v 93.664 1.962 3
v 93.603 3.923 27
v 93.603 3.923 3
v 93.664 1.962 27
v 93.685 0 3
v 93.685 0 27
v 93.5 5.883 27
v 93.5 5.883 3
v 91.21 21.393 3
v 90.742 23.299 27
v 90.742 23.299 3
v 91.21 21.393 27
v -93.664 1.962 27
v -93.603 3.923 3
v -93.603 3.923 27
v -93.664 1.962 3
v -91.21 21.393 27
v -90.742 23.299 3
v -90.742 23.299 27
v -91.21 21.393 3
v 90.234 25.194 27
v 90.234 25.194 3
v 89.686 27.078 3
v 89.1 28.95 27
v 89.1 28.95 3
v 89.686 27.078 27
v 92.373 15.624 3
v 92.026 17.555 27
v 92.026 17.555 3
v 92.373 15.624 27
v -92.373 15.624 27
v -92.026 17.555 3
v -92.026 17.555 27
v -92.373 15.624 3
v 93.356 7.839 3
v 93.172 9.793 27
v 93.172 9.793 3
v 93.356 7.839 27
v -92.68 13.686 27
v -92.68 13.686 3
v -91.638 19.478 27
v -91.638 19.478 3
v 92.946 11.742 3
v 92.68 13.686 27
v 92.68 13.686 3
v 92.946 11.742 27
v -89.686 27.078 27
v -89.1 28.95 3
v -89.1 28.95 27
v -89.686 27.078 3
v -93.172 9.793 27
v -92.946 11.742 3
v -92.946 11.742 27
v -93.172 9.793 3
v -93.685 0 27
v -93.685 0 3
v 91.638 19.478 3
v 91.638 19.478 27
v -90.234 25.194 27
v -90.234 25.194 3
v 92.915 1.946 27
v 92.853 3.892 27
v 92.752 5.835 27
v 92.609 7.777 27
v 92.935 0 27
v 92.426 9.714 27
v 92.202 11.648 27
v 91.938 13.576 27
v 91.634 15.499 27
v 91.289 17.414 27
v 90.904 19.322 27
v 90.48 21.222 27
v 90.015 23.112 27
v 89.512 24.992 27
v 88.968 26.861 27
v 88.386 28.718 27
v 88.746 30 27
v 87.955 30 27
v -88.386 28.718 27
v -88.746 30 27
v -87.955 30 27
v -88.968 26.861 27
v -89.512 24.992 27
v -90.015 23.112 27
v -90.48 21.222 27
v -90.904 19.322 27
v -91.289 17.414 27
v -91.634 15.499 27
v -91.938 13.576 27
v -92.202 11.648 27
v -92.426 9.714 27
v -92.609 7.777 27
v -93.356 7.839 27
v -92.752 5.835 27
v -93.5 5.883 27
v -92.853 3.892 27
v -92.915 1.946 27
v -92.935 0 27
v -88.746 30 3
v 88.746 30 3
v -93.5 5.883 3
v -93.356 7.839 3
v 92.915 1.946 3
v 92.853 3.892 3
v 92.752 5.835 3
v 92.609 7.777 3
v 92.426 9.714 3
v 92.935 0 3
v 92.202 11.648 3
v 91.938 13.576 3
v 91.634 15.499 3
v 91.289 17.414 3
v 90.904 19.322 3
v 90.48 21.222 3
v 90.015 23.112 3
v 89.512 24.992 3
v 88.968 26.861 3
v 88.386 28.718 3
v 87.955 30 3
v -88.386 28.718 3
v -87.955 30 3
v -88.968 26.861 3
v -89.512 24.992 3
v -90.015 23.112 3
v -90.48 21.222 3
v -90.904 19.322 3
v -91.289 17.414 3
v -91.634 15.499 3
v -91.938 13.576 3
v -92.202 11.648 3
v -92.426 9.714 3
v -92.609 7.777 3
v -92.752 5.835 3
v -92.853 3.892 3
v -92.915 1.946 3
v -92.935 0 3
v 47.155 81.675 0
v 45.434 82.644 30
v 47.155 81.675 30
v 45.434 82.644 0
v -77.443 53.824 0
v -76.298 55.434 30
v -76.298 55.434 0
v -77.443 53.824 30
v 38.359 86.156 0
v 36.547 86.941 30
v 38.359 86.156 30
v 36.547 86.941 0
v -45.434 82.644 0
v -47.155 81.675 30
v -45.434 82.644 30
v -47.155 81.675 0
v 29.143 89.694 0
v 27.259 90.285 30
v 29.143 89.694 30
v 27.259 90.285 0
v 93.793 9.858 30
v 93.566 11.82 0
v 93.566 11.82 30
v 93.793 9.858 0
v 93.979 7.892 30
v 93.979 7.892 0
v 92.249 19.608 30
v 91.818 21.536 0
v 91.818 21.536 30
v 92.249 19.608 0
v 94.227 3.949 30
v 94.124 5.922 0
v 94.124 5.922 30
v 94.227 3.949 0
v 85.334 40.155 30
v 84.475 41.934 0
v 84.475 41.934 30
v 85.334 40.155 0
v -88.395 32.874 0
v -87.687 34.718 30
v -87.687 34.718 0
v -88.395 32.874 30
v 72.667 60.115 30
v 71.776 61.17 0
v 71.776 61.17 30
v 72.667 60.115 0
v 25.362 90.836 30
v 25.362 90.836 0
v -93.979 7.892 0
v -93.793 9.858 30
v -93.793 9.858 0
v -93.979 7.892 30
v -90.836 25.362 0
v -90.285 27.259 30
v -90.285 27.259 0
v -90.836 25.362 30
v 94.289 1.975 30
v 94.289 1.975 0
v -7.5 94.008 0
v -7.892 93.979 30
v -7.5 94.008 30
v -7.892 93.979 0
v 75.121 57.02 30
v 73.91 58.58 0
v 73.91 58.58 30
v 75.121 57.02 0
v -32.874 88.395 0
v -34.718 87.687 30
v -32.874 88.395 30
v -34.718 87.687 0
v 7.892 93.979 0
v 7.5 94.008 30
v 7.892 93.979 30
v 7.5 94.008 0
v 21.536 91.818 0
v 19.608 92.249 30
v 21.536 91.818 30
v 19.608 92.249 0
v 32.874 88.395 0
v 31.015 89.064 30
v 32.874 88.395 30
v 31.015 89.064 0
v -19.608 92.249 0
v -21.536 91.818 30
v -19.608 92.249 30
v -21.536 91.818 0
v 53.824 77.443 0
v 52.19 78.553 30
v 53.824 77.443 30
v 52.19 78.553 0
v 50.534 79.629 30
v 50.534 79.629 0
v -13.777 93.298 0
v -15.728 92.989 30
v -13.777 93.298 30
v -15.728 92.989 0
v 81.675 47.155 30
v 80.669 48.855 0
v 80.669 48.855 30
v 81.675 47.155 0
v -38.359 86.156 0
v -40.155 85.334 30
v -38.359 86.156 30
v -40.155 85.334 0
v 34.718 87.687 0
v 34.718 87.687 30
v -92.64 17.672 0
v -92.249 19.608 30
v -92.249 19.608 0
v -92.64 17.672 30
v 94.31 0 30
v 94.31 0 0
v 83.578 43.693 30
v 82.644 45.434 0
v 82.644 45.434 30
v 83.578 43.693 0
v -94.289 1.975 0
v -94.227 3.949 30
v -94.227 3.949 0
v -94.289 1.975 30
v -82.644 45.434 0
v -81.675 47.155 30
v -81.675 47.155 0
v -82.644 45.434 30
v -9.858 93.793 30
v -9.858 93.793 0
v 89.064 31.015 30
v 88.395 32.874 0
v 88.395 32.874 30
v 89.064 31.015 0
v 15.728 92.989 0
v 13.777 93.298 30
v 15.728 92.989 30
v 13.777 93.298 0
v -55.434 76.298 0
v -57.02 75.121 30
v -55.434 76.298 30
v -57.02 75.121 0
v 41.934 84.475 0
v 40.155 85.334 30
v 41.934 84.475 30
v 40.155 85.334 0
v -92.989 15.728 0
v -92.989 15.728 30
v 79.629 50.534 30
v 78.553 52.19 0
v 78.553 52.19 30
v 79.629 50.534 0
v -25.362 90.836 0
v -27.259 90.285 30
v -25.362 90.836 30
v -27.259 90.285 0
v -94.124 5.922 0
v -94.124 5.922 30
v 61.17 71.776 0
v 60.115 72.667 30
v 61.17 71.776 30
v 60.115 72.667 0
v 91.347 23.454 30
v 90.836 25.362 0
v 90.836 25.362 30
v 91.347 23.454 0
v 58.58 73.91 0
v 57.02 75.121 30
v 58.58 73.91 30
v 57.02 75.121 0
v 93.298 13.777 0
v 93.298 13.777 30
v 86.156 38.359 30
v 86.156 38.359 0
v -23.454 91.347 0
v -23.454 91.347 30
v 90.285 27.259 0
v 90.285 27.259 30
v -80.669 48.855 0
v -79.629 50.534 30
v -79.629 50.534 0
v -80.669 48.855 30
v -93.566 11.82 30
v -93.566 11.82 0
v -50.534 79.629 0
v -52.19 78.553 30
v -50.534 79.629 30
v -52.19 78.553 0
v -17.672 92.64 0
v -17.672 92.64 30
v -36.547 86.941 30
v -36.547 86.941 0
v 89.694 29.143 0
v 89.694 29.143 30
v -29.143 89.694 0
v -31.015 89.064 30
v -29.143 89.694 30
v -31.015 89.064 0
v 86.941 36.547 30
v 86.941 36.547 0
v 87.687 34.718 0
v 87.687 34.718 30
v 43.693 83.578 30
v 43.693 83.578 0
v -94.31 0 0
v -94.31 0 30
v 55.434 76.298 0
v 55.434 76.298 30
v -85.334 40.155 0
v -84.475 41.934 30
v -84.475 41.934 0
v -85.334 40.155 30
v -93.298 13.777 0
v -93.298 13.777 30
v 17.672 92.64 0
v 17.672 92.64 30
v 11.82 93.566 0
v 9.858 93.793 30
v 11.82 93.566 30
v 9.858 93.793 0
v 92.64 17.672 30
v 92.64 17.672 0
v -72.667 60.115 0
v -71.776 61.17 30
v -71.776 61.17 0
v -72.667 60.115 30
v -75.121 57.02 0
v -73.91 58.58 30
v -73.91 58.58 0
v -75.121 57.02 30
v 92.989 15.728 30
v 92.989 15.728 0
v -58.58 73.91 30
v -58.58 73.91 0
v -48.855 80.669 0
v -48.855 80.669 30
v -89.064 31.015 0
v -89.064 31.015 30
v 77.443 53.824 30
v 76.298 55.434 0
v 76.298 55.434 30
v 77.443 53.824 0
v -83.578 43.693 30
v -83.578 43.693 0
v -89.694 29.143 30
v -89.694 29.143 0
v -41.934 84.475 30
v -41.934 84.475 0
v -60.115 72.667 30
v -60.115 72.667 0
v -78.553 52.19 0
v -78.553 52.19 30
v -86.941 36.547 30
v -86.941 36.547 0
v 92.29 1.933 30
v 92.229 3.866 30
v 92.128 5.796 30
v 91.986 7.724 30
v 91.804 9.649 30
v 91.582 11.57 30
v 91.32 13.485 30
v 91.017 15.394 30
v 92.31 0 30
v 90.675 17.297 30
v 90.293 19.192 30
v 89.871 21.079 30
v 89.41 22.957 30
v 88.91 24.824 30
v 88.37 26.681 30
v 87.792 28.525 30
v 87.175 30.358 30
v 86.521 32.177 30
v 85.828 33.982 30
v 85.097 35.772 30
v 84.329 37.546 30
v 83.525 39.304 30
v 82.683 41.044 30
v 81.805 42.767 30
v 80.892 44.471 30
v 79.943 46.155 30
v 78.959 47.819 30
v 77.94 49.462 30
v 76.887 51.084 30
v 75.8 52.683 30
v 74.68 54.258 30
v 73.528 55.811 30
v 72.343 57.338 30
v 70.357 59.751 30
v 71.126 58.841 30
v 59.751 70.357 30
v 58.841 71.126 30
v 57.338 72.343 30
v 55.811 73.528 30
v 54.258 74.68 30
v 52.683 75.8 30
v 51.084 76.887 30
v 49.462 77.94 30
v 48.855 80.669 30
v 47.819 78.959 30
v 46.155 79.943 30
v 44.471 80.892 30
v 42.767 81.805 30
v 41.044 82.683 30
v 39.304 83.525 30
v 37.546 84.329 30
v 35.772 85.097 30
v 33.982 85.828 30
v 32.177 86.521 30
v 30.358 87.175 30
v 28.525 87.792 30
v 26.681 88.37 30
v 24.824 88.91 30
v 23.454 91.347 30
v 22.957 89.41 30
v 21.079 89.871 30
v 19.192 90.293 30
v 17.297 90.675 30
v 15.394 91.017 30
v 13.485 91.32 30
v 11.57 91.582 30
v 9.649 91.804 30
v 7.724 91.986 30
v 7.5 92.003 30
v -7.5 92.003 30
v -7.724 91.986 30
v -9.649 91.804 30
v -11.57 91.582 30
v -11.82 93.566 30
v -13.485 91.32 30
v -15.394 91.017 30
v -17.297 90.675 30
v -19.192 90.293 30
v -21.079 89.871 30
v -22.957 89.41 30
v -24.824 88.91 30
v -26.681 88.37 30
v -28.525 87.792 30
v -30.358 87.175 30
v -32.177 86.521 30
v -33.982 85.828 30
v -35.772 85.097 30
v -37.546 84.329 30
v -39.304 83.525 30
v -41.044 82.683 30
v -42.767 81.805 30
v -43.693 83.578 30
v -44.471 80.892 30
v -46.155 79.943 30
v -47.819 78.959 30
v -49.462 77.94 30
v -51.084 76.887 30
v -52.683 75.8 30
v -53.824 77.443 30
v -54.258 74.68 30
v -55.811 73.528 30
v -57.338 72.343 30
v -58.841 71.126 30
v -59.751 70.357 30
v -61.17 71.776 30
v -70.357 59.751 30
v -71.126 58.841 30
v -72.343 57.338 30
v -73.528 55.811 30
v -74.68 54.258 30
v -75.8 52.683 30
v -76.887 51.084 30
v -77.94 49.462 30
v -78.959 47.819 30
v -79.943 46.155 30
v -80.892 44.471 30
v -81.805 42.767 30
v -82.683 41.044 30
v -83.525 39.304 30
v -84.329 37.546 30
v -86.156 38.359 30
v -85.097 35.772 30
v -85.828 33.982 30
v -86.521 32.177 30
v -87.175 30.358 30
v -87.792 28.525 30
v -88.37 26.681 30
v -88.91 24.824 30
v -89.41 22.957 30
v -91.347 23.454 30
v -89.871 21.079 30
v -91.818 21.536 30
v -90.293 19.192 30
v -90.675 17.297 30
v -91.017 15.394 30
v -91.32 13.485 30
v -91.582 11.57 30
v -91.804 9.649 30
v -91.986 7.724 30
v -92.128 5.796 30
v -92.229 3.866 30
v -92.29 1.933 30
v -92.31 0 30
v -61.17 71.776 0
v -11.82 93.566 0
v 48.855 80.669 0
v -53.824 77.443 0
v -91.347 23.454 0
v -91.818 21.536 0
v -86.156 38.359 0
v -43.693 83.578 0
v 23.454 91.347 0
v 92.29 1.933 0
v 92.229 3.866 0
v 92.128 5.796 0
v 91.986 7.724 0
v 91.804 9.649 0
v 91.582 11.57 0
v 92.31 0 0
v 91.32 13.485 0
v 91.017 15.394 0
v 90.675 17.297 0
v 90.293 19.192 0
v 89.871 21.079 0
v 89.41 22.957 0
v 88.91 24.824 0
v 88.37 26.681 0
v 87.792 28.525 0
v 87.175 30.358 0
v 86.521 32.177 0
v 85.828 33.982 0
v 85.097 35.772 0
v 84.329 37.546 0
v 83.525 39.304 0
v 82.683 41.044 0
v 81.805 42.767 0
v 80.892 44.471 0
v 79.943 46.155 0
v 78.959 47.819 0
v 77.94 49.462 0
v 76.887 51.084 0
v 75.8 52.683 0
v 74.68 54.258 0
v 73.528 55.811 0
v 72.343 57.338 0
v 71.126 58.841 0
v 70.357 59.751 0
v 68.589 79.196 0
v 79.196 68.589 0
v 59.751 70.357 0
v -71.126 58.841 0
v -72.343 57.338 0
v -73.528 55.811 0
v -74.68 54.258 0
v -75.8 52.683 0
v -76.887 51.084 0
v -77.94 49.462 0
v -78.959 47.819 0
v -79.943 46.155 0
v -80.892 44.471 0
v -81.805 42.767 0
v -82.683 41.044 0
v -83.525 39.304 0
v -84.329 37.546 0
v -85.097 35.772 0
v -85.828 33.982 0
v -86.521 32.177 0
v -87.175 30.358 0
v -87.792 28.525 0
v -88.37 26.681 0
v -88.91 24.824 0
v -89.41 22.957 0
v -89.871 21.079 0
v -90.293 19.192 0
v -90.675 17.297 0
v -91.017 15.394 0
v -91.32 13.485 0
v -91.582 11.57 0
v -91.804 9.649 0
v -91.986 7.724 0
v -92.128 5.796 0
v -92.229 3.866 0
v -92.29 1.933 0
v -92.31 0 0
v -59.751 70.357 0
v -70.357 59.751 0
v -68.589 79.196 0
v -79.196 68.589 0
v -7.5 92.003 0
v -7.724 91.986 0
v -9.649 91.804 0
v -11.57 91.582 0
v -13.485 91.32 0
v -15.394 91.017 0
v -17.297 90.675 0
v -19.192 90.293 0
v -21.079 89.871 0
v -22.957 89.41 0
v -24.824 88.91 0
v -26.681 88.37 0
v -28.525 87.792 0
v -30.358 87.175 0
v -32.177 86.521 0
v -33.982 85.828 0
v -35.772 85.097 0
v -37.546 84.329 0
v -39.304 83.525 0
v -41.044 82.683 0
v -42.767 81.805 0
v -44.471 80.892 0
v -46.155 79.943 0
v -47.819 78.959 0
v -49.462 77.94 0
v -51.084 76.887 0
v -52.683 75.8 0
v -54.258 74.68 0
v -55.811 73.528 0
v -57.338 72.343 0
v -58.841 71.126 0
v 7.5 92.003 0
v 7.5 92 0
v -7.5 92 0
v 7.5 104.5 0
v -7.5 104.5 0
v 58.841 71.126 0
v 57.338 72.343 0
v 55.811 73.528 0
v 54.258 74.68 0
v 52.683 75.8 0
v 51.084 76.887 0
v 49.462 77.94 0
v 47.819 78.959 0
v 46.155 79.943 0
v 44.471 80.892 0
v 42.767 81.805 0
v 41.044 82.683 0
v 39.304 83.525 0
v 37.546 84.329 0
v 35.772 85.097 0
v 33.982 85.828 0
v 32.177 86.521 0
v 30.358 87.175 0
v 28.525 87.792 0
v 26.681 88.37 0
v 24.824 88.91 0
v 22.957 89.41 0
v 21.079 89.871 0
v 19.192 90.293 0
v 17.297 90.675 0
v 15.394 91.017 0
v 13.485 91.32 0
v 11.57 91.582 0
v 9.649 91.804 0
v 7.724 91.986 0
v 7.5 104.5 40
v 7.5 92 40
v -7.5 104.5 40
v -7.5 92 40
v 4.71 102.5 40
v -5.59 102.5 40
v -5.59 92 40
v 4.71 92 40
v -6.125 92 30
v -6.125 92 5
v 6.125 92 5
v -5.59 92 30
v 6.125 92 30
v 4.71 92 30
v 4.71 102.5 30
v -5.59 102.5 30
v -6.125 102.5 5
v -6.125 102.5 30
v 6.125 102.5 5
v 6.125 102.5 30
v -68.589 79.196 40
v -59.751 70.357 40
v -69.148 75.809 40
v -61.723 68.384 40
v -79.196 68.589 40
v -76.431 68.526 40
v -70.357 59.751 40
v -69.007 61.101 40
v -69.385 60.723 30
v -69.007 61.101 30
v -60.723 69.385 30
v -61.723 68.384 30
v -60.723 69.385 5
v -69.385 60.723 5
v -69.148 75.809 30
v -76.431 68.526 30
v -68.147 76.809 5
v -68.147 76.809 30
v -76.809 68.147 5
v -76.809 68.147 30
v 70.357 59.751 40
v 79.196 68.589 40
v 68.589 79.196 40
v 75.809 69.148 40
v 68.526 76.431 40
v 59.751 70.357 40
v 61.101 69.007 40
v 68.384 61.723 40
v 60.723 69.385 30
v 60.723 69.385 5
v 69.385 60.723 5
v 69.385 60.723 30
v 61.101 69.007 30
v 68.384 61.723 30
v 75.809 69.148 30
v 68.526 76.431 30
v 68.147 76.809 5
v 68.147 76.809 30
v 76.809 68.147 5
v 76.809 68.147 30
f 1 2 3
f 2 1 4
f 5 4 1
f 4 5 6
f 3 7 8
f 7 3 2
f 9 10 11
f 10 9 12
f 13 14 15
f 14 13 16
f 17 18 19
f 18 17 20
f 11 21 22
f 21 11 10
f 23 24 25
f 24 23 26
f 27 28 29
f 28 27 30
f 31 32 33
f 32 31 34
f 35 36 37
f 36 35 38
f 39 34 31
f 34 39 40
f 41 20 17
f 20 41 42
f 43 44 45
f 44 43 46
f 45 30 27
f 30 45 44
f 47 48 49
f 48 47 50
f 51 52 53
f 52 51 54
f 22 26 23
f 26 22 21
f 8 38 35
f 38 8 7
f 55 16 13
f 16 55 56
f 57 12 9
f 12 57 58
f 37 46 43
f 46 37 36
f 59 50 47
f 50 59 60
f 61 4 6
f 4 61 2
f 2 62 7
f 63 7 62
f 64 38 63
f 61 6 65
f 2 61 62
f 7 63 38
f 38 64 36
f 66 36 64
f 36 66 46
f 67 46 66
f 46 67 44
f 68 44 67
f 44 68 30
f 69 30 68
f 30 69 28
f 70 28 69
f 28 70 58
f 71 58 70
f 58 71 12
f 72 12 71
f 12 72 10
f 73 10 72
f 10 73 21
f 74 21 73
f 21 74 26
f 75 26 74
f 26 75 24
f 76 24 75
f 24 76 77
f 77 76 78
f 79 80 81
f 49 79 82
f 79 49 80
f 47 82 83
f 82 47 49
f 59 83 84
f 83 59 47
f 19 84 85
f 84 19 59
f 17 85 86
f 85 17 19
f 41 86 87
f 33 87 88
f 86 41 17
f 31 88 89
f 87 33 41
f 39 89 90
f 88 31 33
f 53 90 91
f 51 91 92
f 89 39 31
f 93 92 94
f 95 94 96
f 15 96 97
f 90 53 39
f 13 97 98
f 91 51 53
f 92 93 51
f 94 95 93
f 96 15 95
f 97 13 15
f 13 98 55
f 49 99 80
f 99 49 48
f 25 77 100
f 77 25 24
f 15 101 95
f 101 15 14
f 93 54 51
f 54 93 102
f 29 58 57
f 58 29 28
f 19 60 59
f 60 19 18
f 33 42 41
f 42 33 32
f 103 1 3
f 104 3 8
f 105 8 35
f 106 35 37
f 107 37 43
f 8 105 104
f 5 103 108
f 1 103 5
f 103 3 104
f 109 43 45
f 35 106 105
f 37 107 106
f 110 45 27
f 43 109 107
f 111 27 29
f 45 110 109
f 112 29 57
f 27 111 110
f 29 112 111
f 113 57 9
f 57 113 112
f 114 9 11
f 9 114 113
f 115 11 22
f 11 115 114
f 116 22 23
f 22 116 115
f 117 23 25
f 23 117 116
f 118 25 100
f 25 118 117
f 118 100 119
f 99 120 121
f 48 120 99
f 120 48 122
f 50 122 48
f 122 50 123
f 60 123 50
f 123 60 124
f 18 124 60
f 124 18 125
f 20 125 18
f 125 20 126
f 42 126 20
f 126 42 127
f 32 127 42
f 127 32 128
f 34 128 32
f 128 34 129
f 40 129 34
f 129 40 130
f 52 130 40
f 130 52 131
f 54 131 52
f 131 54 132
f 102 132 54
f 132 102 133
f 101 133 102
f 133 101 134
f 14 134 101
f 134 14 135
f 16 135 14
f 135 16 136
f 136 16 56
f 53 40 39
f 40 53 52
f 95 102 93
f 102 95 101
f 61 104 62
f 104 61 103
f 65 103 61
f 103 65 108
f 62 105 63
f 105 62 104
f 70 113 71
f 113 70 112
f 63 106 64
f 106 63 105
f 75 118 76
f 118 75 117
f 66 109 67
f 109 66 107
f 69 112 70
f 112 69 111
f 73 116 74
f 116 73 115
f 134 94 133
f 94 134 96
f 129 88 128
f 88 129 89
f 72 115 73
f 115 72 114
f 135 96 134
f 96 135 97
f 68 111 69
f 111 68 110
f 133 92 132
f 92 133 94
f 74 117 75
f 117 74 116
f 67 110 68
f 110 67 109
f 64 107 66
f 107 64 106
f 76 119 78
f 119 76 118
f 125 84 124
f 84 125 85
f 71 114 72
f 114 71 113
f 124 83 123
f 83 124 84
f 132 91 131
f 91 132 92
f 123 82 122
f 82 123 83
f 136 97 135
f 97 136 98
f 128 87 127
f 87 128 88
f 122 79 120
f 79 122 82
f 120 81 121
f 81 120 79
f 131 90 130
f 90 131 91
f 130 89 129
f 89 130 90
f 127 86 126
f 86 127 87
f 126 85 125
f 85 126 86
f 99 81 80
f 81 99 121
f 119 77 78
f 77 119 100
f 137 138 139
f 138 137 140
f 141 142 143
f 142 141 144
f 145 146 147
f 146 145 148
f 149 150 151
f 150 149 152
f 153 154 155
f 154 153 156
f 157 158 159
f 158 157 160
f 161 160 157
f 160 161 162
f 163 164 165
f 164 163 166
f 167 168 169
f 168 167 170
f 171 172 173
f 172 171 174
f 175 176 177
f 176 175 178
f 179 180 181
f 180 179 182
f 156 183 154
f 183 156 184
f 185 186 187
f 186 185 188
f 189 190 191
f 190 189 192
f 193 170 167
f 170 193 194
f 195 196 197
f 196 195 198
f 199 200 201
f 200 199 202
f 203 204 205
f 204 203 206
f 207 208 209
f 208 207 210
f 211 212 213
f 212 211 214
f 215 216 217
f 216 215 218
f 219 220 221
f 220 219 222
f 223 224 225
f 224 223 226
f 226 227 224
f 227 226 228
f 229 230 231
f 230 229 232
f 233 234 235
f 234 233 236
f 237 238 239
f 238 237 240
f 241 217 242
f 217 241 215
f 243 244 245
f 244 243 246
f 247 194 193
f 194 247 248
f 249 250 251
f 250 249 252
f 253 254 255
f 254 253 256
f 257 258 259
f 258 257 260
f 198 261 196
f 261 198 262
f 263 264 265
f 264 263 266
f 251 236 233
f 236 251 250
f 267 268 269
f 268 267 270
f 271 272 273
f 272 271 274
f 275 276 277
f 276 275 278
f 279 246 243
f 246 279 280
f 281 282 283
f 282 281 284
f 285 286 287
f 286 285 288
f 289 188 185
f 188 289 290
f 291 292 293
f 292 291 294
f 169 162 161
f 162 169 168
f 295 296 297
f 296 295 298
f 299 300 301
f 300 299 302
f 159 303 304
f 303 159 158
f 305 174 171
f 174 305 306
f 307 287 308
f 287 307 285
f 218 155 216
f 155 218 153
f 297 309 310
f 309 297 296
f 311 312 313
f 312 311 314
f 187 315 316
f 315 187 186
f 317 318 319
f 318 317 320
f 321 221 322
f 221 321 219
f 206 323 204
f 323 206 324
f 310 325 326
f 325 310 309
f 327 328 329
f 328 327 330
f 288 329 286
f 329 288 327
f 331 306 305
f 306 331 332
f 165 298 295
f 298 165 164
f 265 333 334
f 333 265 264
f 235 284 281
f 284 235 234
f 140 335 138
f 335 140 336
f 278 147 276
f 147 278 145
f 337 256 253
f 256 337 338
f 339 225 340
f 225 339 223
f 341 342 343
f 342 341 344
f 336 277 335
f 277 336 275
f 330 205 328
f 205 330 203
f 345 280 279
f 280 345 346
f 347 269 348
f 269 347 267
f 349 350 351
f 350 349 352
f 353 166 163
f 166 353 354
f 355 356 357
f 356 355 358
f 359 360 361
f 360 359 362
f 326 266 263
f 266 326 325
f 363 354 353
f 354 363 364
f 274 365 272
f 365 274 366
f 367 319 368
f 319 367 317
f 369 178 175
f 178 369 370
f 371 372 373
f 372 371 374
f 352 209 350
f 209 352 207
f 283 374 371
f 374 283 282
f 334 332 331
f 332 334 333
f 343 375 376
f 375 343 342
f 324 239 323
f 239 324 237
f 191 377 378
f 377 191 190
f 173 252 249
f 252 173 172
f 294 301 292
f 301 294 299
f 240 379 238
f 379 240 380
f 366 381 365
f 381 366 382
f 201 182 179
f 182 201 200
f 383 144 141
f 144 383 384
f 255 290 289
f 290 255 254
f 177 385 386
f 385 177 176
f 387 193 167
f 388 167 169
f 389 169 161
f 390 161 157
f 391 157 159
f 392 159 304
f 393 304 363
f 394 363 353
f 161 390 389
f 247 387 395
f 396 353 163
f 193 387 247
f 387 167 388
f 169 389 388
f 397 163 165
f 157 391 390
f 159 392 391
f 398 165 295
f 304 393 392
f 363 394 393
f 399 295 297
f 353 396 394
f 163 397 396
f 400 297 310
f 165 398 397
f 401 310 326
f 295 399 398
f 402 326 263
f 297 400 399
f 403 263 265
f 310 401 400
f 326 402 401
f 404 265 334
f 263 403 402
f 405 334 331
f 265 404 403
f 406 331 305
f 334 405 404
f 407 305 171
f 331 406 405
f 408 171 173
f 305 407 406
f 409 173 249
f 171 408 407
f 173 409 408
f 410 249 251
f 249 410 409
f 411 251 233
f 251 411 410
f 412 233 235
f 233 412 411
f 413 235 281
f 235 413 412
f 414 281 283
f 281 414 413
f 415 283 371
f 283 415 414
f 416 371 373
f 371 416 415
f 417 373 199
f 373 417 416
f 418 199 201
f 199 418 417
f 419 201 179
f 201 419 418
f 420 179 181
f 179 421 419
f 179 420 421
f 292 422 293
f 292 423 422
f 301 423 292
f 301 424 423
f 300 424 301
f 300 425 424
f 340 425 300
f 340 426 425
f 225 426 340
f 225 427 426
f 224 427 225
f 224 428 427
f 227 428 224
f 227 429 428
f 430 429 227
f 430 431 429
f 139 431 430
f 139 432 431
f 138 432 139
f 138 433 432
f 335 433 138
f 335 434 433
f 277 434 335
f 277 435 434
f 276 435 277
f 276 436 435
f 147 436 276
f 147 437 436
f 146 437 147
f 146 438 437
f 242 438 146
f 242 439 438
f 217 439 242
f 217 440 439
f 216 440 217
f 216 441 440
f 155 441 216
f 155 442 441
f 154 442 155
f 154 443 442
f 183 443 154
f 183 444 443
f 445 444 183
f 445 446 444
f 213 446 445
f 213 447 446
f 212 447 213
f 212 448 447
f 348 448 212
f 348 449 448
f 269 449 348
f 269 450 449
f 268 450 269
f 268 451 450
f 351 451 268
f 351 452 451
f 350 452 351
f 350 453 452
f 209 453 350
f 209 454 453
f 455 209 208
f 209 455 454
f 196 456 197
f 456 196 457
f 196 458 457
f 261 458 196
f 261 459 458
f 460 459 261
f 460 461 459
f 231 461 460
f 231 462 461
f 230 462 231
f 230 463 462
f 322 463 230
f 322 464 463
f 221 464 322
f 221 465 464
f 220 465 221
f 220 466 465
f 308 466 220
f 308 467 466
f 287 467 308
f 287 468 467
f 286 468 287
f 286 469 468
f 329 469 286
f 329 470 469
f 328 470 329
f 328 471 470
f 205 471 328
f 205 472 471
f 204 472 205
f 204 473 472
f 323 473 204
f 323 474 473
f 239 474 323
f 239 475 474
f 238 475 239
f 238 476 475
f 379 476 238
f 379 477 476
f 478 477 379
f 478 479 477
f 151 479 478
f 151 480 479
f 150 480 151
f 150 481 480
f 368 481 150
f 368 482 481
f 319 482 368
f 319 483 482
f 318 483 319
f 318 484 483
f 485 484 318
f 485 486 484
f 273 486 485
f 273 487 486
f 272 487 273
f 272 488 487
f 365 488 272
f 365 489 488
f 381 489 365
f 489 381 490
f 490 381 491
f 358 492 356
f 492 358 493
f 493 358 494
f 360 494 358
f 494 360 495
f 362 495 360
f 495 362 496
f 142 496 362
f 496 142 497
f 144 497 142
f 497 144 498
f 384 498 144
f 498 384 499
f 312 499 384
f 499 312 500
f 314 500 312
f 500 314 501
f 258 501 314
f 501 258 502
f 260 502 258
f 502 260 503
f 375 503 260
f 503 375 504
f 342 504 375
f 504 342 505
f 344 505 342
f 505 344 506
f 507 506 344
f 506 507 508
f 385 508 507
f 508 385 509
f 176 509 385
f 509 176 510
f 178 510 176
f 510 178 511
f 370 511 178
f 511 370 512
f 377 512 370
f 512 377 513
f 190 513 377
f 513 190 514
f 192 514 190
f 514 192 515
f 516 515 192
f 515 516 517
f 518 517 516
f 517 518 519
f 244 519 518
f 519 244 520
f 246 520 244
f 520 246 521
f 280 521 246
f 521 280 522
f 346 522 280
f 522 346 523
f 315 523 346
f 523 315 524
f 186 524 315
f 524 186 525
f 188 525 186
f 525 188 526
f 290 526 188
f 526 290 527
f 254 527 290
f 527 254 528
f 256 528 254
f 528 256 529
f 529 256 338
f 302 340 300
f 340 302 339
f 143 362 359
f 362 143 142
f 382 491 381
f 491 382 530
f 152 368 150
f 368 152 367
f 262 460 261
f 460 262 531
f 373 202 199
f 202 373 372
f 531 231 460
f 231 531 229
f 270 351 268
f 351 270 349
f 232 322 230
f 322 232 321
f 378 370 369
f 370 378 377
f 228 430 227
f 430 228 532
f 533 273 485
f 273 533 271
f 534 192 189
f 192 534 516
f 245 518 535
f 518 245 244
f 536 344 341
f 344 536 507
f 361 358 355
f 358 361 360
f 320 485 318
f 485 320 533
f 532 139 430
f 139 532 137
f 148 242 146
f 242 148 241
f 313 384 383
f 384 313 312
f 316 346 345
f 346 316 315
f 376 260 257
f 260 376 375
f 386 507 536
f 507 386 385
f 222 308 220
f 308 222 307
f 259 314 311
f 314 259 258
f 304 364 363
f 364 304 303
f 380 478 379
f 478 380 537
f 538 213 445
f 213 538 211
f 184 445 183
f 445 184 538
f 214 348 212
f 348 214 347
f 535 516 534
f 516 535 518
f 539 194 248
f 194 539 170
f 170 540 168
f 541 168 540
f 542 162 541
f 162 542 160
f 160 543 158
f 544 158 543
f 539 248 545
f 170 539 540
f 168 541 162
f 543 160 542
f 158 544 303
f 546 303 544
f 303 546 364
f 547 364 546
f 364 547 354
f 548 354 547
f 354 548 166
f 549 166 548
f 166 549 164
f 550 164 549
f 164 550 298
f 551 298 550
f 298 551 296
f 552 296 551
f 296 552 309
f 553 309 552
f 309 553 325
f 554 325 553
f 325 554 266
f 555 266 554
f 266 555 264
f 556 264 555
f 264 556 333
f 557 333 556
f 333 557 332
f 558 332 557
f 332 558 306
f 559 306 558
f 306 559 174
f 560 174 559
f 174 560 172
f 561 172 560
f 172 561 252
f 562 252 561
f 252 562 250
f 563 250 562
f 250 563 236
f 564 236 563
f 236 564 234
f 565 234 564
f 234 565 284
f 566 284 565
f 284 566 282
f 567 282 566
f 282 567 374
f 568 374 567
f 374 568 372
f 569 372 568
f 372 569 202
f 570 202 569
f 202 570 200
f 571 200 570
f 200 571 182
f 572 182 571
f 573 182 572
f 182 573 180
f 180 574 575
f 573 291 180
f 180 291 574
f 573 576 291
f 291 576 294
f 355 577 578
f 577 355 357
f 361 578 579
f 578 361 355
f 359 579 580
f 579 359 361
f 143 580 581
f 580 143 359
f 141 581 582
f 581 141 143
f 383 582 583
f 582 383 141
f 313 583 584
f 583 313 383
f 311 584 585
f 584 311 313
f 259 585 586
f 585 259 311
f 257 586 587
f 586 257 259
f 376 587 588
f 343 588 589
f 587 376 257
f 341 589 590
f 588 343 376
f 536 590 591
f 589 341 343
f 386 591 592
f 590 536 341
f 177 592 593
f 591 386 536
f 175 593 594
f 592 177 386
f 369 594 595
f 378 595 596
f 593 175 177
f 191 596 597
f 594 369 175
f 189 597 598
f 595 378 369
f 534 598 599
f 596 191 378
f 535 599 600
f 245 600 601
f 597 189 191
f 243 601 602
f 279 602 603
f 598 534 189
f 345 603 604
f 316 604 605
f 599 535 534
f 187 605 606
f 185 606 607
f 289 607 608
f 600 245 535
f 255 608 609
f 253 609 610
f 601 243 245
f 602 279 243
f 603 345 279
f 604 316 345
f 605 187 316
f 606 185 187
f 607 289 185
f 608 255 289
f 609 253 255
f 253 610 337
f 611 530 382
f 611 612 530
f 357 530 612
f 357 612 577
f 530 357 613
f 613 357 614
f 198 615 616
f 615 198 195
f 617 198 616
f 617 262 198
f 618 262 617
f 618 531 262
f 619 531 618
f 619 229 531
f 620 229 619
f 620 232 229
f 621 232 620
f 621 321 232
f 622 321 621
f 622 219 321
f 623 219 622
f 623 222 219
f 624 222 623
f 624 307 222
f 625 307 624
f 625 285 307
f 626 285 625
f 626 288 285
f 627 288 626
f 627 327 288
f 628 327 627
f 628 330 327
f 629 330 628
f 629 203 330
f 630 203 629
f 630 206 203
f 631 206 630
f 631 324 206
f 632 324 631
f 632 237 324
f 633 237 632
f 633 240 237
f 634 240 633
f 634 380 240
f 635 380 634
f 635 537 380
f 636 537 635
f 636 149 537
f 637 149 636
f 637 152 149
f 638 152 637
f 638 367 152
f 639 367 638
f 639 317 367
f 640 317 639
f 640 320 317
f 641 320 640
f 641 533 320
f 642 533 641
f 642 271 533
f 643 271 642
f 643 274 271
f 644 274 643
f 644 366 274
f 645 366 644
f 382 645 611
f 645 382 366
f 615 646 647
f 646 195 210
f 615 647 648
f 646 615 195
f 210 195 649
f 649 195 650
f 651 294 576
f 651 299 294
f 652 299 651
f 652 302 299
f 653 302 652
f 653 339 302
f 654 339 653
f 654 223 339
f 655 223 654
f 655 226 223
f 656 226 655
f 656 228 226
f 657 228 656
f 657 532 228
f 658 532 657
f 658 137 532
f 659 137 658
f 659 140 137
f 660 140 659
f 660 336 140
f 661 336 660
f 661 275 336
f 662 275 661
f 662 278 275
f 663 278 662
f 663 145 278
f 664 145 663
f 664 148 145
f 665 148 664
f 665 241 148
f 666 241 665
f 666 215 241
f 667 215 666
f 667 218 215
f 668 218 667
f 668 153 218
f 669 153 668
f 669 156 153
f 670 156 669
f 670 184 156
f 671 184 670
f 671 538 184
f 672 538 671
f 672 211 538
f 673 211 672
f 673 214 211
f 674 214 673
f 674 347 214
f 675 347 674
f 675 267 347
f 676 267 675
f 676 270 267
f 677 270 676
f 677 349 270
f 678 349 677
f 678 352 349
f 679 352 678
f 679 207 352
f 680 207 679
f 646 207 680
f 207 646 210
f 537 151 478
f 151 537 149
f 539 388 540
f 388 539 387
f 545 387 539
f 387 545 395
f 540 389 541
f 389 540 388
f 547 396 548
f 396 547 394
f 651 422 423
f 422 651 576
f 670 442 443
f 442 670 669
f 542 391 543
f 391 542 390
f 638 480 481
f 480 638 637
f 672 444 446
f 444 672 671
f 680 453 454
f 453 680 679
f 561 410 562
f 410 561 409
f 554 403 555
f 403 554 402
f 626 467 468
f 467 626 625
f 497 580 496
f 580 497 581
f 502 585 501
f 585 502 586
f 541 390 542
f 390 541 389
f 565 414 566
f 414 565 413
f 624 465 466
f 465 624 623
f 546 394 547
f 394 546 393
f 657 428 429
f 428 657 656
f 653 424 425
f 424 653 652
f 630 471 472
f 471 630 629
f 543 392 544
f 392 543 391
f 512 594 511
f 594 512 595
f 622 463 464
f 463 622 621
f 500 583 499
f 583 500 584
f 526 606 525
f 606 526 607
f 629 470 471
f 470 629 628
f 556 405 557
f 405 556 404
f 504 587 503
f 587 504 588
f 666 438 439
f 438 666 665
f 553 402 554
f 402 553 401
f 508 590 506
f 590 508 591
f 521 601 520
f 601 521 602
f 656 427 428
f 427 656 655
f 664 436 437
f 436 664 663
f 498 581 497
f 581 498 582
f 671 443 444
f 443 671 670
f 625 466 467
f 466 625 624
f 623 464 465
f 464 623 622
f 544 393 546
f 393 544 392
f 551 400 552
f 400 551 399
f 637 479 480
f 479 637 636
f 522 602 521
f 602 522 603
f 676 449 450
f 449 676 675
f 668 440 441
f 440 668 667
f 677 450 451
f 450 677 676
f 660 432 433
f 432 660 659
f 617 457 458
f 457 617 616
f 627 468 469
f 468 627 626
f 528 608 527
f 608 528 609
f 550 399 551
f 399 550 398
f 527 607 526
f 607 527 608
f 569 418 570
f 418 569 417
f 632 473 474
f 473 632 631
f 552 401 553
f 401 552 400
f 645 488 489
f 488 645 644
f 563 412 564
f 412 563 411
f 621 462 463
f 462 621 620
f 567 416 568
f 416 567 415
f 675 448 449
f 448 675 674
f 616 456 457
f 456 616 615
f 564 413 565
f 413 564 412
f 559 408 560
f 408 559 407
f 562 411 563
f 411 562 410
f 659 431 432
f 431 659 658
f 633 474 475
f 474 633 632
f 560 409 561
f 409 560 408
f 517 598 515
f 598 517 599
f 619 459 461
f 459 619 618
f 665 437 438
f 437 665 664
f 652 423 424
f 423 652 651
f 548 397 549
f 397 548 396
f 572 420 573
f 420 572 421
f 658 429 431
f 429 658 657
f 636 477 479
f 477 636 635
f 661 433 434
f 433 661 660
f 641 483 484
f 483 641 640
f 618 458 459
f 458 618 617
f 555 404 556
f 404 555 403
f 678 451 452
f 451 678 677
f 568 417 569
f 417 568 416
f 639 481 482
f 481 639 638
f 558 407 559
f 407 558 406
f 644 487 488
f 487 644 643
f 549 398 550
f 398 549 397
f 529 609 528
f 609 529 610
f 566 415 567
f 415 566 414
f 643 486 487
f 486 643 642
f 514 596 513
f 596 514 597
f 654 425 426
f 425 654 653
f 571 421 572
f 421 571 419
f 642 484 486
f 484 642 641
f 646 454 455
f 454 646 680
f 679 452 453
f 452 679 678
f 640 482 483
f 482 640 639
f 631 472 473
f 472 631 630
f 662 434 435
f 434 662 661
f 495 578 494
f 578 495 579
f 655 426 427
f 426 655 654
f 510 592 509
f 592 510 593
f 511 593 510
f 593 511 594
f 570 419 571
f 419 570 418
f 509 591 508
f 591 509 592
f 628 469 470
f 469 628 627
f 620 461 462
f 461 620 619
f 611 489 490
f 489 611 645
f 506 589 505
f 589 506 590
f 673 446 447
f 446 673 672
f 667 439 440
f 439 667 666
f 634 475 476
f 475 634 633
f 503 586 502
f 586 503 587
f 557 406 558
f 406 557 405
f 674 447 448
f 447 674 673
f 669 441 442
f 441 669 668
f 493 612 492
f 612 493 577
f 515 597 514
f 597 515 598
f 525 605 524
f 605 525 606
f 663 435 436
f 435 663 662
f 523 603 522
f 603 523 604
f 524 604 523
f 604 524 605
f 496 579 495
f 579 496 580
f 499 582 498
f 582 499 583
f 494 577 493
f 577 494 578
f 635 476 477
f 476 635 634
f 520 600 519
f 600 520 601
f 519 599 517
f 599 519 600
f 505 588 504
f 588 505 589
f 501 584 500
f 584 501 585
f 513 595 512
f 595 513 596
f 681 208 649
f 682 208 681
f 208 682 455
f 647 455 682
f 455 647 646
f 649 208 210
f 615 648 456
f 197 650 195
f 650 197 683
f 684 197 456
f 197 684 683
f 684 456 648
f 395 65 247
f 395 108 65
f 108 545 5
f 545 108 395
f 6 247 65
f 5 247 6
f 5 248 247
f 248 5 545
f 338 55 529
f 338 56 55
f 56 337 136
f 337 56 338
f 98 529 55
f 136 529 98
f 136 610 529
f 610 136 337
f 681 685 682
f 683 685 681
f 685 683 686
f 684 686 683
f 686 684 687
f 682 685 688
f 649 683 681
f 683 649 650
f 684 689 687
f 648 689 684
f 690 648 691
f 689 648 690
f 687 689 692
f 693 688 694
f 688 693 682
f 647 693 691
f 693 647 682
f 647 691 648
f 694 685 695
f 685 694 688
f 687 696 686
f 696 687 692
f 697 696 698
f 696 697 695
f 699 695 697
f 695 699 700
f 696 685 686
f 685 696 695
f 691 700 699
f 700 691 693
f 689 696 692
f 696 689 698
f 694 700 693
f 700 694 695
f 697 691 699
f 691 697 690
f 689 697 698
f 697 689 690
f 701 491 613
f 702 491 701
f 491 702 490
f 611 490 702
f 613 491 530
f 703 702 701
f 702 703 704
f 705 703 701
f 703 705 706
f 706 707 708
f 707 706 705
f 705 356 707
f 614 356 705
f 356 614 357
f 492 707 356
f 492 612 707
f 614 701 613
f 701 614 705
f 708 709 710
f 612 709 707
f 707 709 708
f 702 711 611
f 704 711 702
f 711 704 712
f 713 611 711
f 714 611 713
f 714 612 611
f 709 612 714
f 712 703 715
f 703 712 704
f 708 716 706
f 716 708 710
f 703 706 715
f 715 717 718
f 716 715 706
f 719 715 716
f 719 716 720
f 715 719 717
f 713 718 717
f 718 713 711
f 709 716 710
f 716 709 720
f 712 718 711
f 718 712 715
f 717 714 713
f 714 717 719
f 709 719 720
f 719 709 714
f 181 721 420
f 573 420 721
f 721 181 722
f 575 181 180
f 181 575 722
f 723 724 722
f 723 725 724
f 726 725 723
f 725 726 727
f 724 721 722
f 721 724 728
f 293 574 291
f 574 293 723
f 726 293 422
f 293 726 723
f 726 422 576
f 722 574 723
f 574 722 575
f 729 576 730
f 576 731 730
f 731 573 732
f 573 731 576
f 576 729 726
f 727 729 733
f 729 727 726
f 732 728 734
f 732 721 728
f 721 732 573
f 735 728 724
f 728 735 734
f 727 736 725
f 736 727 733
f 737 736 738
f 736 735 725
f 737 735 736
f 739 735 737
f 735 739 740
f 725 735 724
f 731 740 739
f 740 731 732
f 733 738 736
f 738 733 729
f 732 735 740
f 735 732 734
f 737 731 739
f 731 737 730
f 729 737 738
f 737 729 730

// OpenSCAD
dring=184.62;
//58cm as circumference
resolution=300;

difference(){
    cylinder(d=dring+4,h=30, $fn=resolution);
    cylinder(d=dring,h=40, $fn=resolution);
    translate([-7.5,dring/2-0.31,0])cube([1.5*10,1*10,5*10]);
    rotate([0,0,45])translate([-7.5,dring/2-0.31,0])cube([1.5*10,1*10,5*10]);
    rotate([0,0,-45])translate([-7.5,dring/2-0.31,0])cube([1.5*10,1*10,5*10]);
    
    translate([-150,-300,0])cube([300,300,300]);
    
    /*
    #translate([7.5,dring/2,0])cube([10,10,100],center=true);
    #translate([-7.5,dring/2,0])cube([10,10,100],center=true);
    #translate([0,-10,0])cube([200,90,100],center=true);
    #translate([-60,dring/2,0])cube([100,200,100],center=true);
    #translate([60,dring/2,0])cube([100,200,100],center=true);
    */
       
    union(){
        difference(){
            translate([0,0,3])cylinder(d=dring+2.75,h=24, $fn=resolution);
            cylinder(d=dring+1.25,h=40, $fn=resolution);
            translate([-150,30,0])cube([300,300,300]);
            }
        }
    
    }
    
 
translate([-7.5,dring/2-0.31,0])scale([10,10,10]){    
 difference(){
    cube([1.5,0.9+0.35,3+1]);
    translate([.135+0.092-0.036,0,2])cube([1.03,.7+0.35,2+1]);
    translate([.375-0.2375,0,0.5])cube([1.225,.7+0.35,1.5+1]);
}
}


rotate([0,0,45])translate([-7.5,dring/2-0.31,0])scale([10,10,10]){    
 difference(){
    cube([1.5,0.9+0.35,3+1]);
    translate([.135+0.092-0.036,0,2])cube([1.03,.7+0.35,2+1]);
    translate([.375-0.2375,0,0.5])cube([1.225,.7+0.35,1.5+1]);
}
}

rotate([0,0,-45])translate([-7.5,dring/2-0.31,0])scale([10,10,10]){    
 difference(){
    cube([1.5,0.9+0.35,3+1]);
    translate([.135+0.092-0.036,0,2])cube([1.03,.7+0.35,2+1]);
    translate([.375-0.2375,0,0.5])cube([1.225,.7+0.35,1.5+1]);
}
}
